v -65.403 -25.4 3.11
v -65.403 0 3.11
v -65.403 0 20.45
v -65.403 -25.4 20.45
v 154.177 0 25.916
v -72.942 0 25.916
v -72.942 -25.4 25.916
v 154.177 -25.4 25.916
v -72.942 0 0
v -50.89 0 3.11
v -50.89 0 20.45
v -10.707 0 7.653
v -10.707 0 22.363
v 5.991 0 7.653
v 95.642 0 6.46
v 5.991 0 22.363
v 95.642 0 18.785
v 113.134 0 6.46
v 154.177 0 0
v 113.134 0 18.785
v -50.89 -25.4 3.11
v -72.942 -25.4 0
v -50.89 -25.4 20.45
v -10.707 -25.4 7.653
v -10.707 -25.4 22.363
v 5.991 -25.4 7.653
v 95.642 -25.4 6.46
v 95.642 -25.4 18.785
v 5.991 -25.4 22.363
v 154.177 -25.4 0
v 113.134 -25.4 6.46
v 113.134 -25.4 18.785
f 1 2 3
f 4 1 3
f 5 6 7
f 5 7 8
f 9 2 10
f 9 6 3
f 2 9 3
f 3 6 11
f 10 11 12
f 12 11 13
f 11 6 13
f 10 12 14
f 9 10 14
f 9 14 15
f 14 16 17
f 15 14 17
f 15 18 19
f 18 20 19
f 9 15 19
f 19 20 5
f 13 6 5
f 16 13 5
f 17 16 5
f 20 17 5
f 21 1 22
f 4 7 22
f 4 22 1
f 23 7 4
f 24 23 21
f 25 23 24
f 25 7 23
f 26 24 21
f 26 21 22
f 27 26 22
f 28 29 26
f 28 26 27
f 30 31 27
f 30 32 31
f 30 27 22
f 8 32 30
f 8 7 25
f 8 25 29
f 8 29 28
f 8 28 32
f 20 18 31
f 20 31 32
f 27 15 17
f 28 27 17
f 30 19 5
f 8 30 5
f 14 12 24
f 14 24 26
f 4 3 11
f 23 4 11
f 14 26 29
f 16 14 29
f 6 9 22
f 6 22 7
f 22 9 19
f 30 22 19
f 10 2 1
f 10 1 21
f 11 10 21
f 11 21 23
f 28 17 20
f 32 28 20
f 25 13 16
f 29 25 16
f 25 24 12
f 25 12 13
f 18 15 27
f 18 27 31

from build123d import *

# Parameters (mm, degrees)
F0_W     = 227.11908
F0_H     = 25.916077
F0_W_2   = 14.513008
F0_H_2   = 17.340212
F0_W_3   = 17.492868
F0_H_3   = 12.324523
F0_W_4   = 16.69774
F0_H_4   = 14.709914
F1_DEPTH = 25.4


with BuildPart() as f1:
    # F0 (on Front) → F1 (new body)
    with BuildSketch(Plane.XZ):
        with Locations((40.617559, 12.958038)):
            Rectangle(F0_W, F0_H)
        with Locations((-58.146257, 11.780035)):
            Rectangle(F0_W_2, F0_H_2, mode=Mode.SUBTRACT)
        with Locations((104.388017, 12.622695)):
            Rectangle(F0_W_3, F0_H_3, mode=Mode.SUBTRACT)
        with Locations((-2.358241, 15.008087)):
            Rectangle(F0_W_4, F0_H_4, mode=Mode.SUBTRACT)
    extrude(amount=F1_DEPTH)


solid = f1.part
